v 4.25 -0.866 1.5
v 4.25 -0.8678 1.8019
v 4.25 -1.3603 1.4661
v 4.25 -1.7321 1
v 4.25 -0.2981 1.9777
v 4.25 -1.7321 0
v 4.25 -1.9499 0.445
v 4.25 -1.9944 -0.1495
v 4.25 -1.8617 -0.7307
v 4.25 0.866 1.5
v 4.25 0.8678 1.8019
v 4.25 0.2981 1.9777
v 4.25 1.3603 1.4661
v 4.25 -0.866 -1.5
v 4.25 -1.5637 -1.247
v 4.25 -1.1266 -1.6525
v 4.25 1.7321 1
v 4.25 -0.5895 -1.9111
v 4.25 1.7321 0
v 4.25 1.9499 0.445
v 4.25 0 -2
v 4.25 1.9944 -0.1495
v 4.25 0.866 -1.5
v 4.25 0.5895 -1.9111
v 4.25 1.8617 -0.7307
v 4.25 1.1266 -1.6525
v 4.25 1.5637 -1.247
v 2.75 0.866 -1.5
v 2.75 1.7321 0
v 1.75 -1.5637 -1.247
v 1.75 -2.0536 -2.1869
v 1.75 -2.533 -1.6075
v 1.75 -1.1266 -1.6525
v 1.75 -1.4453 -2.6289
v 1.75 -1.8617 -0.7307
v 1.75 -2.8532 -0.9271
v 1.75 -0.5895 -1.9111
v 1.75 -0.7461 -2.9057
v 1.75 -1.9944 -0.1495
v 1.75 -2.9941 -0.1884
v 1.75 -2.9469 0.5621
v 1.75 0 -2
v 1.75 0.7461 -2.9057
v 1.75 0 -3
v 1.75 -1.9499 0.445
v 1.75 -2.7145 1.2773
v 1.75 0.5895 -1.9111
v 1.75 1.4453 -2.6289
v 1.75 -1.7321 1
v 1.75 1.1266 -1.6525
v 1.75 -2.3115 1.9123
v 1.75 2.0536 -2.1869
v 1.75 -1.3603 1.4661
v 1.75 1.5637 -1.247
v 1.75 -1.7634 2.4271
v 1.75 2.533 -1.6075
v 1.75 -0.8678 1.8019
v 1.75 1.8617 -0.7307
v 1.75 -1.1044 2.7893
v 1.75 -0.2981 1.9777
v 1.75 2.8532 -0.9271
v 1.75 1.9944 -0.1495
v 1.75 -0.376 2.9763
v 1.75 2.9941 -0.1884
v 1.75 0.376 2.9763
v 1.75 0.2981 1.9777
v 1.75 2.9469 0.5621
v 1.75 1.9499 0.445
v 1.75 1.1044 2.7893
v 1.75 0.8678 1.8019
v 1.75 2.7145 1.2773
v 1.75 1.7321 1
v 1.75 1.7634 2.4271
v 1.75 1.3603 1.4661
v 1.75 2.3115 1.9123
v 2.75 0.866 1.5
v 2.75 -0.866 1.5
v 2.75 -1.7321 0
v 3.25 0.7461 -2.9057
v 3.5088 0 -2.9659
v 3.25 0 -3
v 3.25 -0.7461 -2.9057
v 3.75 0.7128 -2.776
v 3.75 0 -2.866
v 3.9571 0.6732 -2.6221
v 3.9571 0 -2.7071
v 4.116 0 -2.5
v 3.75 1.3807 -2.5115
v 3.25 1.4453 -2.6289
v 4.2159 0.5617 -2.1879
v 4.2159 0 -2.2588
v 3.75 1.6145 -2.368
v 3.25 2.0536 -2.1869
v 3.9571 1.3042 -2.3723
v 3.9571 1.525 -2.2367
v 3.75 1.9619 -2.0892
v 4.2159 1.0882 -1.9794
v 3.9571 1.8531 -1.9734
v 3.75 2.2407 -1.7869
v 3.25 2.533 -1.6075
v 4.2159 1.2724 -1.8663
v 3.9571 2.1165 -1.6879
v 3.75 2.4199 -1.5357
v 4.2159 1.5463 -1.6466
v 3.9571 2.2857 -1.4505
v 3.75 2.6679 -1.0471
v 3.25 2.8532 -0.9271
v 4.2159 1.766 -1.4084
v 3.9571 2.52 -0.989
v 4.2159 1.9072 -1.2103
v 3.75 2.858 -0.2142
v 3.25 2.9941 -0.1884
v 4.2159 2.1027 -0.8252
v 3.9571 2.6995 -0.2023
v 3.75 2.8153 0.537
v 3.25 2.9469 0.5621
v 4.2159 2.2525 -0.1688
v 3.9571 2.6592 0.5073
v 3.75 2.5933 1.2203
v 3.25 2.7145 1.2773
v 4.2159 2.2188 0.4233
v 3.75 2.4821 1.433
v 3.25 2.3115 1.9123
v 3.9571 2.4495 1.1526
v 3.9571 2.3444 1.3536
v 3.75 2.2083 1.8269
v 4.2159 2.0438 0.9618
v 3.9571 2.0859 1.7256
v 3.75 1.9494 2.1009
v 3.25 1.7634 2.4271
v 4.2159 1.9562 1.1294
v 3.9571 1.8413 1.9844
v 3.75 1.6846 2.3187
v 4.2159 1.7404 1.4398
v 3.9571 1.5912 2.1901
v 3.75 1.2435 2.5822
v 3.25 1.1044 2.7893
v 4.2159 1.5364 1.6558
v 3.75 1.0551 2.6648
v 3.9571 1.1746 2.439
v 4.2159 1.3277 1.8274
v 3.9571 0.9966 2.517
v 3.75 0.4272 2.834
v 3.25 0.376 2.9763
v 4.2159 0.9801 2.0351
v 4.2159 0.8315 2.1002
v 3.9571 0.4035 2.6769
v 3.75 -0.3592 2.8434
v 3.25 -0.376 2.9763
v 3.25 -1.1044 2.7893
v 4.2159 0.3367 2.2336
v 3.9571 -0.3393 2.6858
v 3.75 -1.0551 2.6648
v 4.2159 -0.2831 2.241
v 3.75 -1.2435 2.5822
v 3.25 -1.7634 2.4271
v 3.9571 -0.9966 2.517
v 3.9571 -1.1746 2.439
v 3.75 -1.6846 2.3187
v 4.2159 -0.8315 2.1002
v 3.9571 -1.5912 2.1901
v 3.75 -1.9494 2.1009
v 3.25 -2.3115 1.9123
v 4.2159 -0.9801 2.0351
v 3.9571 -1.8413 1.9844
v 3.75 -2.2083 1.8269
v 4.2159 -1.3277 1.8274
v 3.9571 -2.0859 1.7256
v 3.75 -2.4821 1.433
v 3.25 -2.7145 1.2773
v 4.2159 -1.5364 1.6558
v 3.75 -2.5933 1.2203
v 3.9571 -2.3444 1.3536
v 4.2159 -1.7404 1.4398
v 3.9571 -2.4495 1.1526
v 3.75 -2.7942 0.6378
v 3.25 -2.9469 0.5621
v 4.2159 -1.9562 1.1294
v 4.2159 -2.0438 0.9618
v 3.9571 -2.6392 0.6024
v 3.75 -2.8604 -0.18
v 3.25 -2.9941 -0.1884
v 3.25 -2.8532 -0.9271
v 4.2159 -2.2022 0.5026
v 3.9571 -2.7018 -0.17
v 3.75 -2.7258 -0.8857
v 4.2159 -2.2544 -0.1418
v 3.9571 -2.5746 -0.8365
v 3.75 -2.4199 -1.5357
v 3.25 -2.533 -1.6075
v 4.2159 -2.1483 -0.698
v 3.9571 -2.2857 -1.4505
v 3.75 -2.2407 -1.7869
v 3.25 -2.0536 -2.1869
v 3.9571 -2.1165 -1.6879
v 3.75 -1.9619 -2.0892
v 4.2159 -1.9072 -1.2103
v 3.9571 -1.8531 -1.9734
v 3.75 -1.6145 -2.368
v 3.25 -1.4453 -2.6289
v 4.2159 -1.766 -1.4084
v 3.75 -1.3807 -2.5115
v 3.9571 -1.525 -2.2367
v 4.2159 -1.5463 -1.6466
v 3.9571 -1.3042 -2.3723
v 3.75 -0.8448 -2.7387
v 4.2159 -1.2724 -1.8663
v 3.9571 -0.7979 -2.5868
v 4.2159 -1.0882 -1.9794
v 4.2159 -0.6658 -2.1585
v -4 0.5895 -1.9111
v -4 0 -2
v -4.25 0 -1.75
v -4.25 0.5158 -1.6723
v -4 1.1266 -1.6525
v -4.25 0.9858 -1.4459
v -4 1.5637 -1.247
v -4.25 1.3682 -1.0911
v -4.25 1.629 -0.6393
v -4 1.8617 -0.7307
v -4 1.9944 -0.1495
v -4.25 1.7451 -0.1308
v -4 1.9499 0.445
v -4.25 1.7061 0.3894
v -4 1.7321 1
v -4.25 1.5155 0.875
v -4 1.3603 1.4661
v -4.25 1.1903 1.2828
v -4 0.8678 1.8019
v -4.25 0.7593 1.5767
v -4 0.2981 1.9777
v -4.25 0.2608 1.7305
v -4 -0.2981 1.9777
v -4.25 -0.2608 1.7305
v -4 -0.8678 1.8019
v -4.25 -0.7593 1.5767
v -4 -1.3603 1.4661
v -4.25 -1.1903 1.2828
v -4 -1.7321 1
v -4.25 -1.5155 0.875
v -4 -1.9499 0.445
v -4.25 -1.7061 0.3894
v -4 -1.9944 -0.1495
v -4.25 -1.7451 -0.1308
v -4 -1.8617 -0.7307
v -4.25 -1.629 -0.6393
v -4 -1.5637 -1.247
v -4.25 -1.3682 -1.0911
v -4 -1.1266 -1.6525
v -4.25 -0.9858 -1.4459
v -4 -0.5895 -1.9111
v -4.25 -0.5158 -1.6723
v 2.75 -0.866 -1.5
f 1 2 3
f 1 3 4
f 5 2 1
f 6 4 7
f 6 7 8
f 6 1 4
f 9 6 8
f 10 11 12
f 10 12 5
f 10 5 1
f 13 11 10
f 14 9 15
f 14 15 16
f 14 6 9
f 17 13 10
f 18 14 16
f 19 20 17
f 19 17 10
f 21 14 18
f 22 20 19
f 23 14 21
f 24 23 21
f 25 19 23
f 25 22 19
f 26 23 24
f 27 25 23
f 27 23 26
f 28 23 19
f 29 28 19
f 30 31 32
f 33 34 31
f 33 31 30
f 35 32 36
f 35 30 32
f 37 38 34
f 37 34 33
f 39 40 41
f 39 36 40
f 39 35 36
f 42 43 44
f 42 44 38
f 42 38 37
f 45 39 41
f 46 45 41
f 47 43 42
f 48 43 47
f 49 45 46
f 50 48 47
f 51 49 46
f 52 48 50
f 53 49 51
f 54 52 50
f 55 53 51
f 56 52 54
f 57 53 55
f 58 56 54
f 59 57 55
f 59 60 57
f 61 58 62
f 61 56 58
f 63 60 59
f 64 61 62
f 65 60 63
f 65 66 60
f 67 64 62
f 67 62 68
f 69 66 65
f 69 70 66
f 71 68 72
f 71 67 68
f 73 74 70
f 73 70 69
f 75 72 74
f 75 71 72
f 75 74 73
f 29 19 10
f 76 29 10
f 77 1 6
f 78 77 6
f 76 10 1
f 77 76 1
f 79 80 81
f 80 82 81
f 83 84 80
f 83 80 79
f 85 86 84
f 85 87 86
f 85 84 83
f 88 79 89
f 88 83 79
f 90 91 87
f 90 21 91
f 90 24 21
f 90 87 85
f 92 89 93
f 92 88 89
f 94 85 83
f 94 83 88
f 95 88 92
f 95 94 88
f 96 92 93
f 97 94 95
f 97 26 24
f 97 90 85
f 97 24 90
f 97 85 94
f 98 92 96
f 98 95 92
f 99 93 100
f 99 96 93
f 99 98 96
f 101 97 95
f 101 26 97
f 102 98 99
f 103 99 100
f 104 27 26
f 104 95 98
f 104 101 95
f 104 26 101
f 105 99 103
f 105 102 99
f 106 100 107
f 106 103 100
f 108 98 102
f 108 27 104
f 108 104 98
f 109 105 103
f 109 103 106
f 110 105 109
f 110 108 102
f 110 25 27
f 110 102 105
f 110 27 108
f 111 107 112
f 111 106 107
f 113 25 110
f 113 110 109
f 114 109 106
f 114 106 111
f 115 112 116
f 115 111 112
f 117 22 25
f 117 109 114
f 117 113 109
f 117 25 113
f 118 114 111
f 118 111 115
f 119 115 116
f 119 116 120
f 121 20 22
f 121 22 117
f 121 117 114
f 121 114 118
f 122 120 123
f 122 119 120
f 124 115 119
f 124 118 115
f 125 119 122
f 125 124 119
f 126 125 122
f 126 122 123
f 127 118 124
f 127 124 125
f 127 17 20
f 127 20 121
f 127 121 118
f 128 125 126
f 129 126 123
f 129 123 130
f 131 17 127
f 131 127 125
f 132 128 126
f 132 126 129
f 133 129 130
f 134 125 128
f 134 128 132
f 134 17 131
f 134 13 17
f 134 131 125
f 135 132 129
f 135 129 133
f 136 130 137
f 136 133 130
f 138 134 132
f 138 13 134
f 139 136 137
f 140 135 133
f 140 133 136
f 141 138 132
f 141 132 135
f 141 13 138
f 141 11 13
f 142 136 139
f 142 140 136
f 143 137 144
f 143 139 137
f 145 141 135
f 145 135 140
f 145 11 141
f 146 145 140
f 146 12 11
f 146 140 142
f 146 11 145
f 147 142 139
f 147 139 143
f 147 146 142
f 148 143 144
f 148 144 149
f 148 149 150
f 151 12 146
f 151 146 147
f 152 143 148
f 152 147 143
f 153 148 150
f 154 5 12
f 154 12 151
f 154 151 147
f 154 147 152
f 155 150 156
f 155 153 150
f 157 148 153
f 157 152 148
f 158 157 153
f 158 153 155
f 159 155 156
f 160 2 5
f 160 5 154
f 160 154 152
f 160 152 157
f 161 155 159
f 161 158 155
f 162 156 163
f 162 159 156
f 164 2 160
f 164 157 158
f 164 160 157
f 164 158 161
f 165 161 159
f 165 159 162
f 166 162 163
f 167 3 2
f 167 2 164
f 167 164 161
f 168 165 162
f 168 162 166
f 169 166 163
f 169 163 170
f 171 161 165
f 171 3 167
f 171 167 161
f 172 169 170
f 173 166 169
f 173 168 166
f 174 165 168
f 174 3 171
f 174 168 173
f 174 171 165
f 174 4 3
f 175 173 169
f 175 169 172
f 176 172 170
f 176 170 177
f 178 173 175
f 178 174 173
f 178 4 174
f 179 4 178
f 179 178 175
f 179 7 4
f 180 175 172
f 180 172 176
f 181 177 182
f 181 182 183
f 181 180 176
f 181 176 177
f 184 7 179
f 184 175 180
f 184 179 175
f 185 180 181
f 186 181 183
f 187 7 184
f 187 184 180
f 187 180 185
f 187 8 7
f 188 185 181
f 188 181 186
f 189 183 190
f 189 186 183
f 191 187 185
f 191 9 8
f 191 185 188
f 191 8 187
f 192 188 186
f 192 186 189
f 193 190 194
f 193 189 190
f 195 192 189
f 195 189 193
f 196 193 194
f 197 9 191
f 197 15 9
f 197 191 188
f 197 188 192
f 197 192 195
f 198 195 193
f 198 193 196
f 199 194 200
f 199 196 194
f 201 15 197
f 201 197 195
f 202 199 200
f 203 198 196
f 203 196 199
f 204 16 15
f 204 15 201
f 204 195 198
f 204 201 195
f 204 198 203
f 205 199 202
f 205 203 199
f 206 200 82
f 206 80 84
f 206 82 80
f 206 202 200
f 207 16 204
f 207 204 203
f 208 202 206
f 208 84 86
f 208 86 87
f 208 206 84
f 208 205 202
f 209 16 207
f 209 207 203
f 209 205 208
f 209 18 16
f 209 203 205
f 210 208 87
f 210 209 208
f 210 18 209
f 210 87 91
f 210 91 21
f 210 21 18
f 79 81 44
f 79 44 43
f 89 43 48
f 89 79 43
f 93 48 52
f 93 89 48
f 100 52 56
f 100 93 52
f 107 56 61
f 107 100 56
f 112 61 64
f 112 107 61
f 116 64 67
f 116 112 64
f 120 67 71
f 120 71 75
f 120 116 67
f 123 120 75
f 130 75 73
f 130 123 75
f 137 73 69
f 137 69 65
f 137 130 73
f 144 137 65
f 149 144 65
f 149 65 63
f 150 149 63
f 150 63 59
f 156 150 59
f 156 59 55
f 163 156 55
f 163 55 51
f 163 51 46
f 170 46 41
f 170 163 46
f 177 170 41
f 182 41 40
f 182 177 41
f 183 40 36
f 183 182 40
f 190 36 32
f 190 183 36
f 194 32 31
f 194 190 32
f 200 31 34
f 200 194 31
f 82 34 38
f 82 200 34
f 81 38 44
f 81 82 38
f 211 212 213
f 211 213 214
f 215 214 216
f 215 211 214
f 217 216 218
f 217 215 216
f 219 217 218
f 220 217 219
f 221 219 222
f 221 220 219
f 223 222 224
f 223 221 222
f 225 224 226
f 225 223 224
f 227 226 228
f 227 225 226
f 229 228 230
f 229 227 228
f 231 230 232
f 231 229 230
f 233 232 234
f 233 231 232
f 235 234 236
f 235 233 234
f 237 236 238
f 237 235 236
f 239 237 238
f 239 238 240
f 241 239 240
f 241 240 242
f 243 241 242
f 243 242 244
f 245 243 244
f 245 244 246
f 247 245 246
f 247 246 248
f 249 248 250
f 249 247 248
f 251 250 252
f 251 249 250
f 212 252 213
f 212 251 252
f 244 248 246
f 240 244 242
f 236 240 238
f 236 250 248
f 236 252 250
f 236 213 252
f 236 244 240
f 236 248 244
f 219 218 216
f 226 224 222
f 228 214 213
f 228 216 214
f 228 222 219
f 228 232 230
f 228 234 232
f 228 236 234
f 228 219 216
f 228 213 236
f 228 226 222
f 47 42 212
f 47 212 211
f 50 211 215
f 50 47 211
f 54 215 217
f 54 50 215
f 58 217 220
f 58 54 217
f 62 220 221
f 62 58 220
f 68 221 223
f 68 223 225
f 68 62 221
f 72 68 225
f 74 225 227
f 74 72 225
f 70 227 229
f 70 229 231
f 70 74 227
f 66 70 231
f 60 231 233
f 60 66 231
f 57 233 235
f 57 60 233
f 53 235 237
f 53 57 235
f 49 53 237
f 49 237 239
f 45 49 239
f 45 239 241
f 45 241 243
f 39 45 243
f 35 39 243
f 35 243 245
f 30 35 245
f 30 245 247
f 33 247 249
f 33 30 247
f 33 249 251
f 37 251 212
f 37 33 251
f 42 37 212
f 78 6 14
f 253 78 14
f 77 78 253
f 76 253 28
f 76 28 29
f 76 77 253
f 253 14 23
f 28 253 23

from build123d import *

# Parameters (mm, degrees)
F2_SIZE2 = 0.25
F2_SIZE  = 0.25
F3_R     = 1
F5_DEPTH = 1.5


with BuildPart() as f1:
    # F0 (on Front) → F1 (revolve)
    with BuildSketch(Plane.XZ):
        Polygon((4.25, 0), (-4.25, 0), (-4.25, -2), (1.75, -2), (1.75, -3), (4.25, -3), align=None)
    revolve(axis=Axis((4.160319, 0, 0), (1, 0, 0)))

    # F2
    f2_edges = [f1.edges().sort_by_distance(p)[0] for p in [
        (-4.25, 0, 2),
    ]]
    chamfer(f2_edges, length=F2_SIZE, length2=F2_SIZE2)

    # F3
    f3_edges = [f1.edges().sort_by_distance(p)[0] for p in [
        (4.25, 0, 3),
    ]]
    fillet(f3_edges, radius=F3_R)

    # F4 (on face) → F5 (cut)
    with BuildSketch(Plane.YZ.offset(4.25)):
        Polygon((0.866025, 1.5), (-0.866025, 1.5), (-1.732051, 0), (-0.866025, -1.5), (0.866025, -1.5), (1.732051, 0), align=None)
    extrude(amount=-F5_DEPTH, mode=Mode.SUBTRACT)


solid = f1.part
